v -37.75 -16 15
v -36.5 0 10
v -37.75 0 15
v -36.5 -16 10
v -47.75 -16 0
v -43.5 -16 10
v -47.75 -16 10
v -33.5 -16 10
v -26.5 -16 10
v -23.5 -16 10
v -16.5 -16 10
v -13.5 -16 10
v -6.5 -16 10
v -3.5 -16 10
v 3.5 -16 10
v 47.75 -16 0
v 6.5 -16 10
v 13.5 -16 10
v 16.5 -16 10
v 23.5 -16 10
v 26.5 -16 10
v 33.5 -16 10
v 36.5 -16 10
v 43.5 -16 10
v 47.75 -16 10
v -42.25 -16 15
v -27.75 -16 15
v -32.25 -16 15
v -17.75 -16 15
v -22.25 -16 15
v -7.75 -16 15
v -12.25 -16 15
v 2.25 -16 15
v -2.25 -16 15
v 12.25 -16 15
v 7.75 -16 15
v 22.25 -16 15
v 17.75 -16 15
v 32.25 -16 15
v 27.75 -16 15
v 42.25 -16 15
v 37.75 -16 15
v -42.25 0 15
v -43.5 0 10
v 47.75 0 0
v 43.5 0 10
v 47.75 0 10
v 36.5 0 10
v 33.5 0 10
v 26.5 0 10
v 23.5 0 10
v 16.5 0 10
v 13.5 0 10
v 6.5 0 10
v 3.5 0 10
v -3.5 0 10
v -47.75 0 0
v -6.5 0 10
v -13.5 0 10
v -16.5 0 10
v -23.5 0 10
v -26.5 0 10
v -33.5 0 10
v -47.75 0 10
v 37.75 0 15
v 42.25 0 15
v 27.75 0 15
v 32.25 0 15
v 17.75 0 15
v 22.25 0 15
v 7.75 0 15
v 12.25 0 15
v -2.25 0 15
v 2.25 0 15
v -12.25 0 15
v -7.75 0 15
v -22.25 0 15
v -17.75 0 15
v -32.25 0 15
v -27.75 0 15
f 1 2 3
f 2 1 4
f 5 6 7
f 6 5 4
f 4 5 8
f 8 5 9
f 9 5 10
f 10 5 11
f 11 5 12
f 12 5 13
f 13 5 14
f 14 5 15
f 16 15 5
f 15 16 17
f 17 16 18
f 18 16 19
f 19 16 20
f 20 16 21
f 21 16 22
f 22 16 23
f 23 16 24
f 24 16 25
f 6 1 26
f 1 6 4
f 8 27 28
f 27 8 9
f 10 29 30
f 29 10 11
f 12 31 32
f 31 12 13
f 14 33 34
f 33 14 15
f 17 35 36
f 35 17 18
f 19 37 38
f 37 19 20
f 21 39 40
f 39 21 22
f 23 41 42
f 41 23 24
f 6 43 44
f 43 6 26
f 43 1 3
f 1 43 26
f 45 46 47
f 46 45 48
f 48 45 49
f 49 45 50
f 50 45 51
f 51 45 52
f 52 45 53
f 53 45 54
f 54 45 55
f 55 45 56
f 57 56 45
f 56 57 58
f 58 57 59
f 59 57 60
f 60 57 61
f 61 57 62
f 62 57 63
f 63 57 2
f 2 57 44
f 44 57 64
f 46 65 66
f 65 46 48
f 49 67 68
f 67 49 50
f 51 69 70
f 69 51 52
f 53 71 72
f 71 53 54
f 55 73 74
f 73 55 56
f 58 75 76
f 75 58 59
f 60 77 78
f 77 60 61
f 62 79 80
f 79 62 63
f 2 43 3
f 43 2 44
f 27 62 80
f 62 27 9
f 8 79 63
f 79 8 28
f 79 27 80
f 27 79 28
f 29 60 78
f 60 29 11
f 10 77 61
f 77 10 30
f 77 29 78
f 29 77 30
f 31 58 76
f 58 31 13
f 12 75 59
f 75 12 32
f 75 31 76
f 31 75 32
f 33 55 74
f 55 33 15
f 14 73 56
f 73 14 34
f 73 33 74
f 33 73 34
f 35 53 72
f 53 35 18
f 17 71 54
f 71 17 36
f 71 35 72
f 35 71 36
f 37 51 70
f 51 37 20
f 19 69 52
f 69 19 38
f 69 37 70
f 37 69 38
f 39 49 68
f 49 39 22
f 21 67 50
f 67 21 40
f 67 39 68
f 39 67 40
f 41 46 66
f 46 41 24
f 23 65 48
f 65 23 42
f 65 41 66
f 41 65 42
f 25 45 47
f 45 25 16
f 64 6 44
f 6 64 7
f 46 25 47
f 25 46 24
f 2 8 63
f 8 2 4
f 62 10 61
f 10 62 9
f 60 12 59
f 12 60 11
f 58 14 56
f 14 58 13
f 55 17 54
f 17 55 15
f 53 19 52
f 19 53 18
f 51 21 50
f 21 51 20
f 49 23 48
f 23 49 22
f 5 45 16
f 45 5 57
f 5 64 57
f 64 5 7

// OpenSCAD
$fn = 32;

// ----------------------------------------------------------------------
// Toothed rack, 9 teeth
// 10 mm pitch, 5 mm teeth
// ----------------------------------------------------------------------

// --- parameters (mm) ---
bar_w = 16;     // bar width (Y)
bar_h = 10;     // bar height (Z)
teeth = 9;      // number of teeth
pitch = 10;     // tooth pitch
tooth_h = 5;    // tooth height above the bar
root_w = 7.5;   // tooth width at the root
crest_w = 4.5;  // tooth width at the crest

// --- derived feature positions (mm) ---
span = (teeth - 1) * pitch;  // = 80   distance between the outer teeth
bar_l = span + root_w + 8;   // = 95.5   bar length: teeth plus 4 mm at each end
tooth_x = -span / 2;         // = -40   X of the first tooth
height = bar_h + tooth_h;    // = 15   overall height
feature_centers = [
  [tooth_x + 0 * pitch, -bar_w / 2],
  [tooth_x + 1 * pitch, -bar_w / 2],
  [tooth_x + 2 * pitch, -bar_w / 2],
  [tooth_x + 3 * pitch, -bar_w / 2],
  [tooth_x + 4 * pitch, -bar_w / 2],
  [tooth_x + 5 * pitch, -bar_w / 2],
  [tooth_x + 6 * pitch, -bar_w / 2],
  [tooth_x + 7 * pitch, -bar_w / 2],
  [tooth_x + 8 * pitch, -bar_w / 2]
];   // tooth centre line, drives the tooth loop

// bar with a rack of teeth, one extruded trapezoium per centre
module rack_tooth() {
  linear_extrude(height = bar_w)
    polygon(points = [
      [0, 0],
      [root_w, 0],
      [root_w / 2 + crest_w / 2, tooth_h + 1],
      [root_w / 2 - crest_w / 2, tooth_h + 1]
    ]);
}

union() {
  translate([-bar_l / 2, -bar_w, 0]) cube([bar_l, bar_w, bar_h]);
  for (centre = feature_centers)
    translate([centre[0] - root_w / 2, 0, bar_h - 1]) rotate([90, 0, 0]) rack_tooth();
}
